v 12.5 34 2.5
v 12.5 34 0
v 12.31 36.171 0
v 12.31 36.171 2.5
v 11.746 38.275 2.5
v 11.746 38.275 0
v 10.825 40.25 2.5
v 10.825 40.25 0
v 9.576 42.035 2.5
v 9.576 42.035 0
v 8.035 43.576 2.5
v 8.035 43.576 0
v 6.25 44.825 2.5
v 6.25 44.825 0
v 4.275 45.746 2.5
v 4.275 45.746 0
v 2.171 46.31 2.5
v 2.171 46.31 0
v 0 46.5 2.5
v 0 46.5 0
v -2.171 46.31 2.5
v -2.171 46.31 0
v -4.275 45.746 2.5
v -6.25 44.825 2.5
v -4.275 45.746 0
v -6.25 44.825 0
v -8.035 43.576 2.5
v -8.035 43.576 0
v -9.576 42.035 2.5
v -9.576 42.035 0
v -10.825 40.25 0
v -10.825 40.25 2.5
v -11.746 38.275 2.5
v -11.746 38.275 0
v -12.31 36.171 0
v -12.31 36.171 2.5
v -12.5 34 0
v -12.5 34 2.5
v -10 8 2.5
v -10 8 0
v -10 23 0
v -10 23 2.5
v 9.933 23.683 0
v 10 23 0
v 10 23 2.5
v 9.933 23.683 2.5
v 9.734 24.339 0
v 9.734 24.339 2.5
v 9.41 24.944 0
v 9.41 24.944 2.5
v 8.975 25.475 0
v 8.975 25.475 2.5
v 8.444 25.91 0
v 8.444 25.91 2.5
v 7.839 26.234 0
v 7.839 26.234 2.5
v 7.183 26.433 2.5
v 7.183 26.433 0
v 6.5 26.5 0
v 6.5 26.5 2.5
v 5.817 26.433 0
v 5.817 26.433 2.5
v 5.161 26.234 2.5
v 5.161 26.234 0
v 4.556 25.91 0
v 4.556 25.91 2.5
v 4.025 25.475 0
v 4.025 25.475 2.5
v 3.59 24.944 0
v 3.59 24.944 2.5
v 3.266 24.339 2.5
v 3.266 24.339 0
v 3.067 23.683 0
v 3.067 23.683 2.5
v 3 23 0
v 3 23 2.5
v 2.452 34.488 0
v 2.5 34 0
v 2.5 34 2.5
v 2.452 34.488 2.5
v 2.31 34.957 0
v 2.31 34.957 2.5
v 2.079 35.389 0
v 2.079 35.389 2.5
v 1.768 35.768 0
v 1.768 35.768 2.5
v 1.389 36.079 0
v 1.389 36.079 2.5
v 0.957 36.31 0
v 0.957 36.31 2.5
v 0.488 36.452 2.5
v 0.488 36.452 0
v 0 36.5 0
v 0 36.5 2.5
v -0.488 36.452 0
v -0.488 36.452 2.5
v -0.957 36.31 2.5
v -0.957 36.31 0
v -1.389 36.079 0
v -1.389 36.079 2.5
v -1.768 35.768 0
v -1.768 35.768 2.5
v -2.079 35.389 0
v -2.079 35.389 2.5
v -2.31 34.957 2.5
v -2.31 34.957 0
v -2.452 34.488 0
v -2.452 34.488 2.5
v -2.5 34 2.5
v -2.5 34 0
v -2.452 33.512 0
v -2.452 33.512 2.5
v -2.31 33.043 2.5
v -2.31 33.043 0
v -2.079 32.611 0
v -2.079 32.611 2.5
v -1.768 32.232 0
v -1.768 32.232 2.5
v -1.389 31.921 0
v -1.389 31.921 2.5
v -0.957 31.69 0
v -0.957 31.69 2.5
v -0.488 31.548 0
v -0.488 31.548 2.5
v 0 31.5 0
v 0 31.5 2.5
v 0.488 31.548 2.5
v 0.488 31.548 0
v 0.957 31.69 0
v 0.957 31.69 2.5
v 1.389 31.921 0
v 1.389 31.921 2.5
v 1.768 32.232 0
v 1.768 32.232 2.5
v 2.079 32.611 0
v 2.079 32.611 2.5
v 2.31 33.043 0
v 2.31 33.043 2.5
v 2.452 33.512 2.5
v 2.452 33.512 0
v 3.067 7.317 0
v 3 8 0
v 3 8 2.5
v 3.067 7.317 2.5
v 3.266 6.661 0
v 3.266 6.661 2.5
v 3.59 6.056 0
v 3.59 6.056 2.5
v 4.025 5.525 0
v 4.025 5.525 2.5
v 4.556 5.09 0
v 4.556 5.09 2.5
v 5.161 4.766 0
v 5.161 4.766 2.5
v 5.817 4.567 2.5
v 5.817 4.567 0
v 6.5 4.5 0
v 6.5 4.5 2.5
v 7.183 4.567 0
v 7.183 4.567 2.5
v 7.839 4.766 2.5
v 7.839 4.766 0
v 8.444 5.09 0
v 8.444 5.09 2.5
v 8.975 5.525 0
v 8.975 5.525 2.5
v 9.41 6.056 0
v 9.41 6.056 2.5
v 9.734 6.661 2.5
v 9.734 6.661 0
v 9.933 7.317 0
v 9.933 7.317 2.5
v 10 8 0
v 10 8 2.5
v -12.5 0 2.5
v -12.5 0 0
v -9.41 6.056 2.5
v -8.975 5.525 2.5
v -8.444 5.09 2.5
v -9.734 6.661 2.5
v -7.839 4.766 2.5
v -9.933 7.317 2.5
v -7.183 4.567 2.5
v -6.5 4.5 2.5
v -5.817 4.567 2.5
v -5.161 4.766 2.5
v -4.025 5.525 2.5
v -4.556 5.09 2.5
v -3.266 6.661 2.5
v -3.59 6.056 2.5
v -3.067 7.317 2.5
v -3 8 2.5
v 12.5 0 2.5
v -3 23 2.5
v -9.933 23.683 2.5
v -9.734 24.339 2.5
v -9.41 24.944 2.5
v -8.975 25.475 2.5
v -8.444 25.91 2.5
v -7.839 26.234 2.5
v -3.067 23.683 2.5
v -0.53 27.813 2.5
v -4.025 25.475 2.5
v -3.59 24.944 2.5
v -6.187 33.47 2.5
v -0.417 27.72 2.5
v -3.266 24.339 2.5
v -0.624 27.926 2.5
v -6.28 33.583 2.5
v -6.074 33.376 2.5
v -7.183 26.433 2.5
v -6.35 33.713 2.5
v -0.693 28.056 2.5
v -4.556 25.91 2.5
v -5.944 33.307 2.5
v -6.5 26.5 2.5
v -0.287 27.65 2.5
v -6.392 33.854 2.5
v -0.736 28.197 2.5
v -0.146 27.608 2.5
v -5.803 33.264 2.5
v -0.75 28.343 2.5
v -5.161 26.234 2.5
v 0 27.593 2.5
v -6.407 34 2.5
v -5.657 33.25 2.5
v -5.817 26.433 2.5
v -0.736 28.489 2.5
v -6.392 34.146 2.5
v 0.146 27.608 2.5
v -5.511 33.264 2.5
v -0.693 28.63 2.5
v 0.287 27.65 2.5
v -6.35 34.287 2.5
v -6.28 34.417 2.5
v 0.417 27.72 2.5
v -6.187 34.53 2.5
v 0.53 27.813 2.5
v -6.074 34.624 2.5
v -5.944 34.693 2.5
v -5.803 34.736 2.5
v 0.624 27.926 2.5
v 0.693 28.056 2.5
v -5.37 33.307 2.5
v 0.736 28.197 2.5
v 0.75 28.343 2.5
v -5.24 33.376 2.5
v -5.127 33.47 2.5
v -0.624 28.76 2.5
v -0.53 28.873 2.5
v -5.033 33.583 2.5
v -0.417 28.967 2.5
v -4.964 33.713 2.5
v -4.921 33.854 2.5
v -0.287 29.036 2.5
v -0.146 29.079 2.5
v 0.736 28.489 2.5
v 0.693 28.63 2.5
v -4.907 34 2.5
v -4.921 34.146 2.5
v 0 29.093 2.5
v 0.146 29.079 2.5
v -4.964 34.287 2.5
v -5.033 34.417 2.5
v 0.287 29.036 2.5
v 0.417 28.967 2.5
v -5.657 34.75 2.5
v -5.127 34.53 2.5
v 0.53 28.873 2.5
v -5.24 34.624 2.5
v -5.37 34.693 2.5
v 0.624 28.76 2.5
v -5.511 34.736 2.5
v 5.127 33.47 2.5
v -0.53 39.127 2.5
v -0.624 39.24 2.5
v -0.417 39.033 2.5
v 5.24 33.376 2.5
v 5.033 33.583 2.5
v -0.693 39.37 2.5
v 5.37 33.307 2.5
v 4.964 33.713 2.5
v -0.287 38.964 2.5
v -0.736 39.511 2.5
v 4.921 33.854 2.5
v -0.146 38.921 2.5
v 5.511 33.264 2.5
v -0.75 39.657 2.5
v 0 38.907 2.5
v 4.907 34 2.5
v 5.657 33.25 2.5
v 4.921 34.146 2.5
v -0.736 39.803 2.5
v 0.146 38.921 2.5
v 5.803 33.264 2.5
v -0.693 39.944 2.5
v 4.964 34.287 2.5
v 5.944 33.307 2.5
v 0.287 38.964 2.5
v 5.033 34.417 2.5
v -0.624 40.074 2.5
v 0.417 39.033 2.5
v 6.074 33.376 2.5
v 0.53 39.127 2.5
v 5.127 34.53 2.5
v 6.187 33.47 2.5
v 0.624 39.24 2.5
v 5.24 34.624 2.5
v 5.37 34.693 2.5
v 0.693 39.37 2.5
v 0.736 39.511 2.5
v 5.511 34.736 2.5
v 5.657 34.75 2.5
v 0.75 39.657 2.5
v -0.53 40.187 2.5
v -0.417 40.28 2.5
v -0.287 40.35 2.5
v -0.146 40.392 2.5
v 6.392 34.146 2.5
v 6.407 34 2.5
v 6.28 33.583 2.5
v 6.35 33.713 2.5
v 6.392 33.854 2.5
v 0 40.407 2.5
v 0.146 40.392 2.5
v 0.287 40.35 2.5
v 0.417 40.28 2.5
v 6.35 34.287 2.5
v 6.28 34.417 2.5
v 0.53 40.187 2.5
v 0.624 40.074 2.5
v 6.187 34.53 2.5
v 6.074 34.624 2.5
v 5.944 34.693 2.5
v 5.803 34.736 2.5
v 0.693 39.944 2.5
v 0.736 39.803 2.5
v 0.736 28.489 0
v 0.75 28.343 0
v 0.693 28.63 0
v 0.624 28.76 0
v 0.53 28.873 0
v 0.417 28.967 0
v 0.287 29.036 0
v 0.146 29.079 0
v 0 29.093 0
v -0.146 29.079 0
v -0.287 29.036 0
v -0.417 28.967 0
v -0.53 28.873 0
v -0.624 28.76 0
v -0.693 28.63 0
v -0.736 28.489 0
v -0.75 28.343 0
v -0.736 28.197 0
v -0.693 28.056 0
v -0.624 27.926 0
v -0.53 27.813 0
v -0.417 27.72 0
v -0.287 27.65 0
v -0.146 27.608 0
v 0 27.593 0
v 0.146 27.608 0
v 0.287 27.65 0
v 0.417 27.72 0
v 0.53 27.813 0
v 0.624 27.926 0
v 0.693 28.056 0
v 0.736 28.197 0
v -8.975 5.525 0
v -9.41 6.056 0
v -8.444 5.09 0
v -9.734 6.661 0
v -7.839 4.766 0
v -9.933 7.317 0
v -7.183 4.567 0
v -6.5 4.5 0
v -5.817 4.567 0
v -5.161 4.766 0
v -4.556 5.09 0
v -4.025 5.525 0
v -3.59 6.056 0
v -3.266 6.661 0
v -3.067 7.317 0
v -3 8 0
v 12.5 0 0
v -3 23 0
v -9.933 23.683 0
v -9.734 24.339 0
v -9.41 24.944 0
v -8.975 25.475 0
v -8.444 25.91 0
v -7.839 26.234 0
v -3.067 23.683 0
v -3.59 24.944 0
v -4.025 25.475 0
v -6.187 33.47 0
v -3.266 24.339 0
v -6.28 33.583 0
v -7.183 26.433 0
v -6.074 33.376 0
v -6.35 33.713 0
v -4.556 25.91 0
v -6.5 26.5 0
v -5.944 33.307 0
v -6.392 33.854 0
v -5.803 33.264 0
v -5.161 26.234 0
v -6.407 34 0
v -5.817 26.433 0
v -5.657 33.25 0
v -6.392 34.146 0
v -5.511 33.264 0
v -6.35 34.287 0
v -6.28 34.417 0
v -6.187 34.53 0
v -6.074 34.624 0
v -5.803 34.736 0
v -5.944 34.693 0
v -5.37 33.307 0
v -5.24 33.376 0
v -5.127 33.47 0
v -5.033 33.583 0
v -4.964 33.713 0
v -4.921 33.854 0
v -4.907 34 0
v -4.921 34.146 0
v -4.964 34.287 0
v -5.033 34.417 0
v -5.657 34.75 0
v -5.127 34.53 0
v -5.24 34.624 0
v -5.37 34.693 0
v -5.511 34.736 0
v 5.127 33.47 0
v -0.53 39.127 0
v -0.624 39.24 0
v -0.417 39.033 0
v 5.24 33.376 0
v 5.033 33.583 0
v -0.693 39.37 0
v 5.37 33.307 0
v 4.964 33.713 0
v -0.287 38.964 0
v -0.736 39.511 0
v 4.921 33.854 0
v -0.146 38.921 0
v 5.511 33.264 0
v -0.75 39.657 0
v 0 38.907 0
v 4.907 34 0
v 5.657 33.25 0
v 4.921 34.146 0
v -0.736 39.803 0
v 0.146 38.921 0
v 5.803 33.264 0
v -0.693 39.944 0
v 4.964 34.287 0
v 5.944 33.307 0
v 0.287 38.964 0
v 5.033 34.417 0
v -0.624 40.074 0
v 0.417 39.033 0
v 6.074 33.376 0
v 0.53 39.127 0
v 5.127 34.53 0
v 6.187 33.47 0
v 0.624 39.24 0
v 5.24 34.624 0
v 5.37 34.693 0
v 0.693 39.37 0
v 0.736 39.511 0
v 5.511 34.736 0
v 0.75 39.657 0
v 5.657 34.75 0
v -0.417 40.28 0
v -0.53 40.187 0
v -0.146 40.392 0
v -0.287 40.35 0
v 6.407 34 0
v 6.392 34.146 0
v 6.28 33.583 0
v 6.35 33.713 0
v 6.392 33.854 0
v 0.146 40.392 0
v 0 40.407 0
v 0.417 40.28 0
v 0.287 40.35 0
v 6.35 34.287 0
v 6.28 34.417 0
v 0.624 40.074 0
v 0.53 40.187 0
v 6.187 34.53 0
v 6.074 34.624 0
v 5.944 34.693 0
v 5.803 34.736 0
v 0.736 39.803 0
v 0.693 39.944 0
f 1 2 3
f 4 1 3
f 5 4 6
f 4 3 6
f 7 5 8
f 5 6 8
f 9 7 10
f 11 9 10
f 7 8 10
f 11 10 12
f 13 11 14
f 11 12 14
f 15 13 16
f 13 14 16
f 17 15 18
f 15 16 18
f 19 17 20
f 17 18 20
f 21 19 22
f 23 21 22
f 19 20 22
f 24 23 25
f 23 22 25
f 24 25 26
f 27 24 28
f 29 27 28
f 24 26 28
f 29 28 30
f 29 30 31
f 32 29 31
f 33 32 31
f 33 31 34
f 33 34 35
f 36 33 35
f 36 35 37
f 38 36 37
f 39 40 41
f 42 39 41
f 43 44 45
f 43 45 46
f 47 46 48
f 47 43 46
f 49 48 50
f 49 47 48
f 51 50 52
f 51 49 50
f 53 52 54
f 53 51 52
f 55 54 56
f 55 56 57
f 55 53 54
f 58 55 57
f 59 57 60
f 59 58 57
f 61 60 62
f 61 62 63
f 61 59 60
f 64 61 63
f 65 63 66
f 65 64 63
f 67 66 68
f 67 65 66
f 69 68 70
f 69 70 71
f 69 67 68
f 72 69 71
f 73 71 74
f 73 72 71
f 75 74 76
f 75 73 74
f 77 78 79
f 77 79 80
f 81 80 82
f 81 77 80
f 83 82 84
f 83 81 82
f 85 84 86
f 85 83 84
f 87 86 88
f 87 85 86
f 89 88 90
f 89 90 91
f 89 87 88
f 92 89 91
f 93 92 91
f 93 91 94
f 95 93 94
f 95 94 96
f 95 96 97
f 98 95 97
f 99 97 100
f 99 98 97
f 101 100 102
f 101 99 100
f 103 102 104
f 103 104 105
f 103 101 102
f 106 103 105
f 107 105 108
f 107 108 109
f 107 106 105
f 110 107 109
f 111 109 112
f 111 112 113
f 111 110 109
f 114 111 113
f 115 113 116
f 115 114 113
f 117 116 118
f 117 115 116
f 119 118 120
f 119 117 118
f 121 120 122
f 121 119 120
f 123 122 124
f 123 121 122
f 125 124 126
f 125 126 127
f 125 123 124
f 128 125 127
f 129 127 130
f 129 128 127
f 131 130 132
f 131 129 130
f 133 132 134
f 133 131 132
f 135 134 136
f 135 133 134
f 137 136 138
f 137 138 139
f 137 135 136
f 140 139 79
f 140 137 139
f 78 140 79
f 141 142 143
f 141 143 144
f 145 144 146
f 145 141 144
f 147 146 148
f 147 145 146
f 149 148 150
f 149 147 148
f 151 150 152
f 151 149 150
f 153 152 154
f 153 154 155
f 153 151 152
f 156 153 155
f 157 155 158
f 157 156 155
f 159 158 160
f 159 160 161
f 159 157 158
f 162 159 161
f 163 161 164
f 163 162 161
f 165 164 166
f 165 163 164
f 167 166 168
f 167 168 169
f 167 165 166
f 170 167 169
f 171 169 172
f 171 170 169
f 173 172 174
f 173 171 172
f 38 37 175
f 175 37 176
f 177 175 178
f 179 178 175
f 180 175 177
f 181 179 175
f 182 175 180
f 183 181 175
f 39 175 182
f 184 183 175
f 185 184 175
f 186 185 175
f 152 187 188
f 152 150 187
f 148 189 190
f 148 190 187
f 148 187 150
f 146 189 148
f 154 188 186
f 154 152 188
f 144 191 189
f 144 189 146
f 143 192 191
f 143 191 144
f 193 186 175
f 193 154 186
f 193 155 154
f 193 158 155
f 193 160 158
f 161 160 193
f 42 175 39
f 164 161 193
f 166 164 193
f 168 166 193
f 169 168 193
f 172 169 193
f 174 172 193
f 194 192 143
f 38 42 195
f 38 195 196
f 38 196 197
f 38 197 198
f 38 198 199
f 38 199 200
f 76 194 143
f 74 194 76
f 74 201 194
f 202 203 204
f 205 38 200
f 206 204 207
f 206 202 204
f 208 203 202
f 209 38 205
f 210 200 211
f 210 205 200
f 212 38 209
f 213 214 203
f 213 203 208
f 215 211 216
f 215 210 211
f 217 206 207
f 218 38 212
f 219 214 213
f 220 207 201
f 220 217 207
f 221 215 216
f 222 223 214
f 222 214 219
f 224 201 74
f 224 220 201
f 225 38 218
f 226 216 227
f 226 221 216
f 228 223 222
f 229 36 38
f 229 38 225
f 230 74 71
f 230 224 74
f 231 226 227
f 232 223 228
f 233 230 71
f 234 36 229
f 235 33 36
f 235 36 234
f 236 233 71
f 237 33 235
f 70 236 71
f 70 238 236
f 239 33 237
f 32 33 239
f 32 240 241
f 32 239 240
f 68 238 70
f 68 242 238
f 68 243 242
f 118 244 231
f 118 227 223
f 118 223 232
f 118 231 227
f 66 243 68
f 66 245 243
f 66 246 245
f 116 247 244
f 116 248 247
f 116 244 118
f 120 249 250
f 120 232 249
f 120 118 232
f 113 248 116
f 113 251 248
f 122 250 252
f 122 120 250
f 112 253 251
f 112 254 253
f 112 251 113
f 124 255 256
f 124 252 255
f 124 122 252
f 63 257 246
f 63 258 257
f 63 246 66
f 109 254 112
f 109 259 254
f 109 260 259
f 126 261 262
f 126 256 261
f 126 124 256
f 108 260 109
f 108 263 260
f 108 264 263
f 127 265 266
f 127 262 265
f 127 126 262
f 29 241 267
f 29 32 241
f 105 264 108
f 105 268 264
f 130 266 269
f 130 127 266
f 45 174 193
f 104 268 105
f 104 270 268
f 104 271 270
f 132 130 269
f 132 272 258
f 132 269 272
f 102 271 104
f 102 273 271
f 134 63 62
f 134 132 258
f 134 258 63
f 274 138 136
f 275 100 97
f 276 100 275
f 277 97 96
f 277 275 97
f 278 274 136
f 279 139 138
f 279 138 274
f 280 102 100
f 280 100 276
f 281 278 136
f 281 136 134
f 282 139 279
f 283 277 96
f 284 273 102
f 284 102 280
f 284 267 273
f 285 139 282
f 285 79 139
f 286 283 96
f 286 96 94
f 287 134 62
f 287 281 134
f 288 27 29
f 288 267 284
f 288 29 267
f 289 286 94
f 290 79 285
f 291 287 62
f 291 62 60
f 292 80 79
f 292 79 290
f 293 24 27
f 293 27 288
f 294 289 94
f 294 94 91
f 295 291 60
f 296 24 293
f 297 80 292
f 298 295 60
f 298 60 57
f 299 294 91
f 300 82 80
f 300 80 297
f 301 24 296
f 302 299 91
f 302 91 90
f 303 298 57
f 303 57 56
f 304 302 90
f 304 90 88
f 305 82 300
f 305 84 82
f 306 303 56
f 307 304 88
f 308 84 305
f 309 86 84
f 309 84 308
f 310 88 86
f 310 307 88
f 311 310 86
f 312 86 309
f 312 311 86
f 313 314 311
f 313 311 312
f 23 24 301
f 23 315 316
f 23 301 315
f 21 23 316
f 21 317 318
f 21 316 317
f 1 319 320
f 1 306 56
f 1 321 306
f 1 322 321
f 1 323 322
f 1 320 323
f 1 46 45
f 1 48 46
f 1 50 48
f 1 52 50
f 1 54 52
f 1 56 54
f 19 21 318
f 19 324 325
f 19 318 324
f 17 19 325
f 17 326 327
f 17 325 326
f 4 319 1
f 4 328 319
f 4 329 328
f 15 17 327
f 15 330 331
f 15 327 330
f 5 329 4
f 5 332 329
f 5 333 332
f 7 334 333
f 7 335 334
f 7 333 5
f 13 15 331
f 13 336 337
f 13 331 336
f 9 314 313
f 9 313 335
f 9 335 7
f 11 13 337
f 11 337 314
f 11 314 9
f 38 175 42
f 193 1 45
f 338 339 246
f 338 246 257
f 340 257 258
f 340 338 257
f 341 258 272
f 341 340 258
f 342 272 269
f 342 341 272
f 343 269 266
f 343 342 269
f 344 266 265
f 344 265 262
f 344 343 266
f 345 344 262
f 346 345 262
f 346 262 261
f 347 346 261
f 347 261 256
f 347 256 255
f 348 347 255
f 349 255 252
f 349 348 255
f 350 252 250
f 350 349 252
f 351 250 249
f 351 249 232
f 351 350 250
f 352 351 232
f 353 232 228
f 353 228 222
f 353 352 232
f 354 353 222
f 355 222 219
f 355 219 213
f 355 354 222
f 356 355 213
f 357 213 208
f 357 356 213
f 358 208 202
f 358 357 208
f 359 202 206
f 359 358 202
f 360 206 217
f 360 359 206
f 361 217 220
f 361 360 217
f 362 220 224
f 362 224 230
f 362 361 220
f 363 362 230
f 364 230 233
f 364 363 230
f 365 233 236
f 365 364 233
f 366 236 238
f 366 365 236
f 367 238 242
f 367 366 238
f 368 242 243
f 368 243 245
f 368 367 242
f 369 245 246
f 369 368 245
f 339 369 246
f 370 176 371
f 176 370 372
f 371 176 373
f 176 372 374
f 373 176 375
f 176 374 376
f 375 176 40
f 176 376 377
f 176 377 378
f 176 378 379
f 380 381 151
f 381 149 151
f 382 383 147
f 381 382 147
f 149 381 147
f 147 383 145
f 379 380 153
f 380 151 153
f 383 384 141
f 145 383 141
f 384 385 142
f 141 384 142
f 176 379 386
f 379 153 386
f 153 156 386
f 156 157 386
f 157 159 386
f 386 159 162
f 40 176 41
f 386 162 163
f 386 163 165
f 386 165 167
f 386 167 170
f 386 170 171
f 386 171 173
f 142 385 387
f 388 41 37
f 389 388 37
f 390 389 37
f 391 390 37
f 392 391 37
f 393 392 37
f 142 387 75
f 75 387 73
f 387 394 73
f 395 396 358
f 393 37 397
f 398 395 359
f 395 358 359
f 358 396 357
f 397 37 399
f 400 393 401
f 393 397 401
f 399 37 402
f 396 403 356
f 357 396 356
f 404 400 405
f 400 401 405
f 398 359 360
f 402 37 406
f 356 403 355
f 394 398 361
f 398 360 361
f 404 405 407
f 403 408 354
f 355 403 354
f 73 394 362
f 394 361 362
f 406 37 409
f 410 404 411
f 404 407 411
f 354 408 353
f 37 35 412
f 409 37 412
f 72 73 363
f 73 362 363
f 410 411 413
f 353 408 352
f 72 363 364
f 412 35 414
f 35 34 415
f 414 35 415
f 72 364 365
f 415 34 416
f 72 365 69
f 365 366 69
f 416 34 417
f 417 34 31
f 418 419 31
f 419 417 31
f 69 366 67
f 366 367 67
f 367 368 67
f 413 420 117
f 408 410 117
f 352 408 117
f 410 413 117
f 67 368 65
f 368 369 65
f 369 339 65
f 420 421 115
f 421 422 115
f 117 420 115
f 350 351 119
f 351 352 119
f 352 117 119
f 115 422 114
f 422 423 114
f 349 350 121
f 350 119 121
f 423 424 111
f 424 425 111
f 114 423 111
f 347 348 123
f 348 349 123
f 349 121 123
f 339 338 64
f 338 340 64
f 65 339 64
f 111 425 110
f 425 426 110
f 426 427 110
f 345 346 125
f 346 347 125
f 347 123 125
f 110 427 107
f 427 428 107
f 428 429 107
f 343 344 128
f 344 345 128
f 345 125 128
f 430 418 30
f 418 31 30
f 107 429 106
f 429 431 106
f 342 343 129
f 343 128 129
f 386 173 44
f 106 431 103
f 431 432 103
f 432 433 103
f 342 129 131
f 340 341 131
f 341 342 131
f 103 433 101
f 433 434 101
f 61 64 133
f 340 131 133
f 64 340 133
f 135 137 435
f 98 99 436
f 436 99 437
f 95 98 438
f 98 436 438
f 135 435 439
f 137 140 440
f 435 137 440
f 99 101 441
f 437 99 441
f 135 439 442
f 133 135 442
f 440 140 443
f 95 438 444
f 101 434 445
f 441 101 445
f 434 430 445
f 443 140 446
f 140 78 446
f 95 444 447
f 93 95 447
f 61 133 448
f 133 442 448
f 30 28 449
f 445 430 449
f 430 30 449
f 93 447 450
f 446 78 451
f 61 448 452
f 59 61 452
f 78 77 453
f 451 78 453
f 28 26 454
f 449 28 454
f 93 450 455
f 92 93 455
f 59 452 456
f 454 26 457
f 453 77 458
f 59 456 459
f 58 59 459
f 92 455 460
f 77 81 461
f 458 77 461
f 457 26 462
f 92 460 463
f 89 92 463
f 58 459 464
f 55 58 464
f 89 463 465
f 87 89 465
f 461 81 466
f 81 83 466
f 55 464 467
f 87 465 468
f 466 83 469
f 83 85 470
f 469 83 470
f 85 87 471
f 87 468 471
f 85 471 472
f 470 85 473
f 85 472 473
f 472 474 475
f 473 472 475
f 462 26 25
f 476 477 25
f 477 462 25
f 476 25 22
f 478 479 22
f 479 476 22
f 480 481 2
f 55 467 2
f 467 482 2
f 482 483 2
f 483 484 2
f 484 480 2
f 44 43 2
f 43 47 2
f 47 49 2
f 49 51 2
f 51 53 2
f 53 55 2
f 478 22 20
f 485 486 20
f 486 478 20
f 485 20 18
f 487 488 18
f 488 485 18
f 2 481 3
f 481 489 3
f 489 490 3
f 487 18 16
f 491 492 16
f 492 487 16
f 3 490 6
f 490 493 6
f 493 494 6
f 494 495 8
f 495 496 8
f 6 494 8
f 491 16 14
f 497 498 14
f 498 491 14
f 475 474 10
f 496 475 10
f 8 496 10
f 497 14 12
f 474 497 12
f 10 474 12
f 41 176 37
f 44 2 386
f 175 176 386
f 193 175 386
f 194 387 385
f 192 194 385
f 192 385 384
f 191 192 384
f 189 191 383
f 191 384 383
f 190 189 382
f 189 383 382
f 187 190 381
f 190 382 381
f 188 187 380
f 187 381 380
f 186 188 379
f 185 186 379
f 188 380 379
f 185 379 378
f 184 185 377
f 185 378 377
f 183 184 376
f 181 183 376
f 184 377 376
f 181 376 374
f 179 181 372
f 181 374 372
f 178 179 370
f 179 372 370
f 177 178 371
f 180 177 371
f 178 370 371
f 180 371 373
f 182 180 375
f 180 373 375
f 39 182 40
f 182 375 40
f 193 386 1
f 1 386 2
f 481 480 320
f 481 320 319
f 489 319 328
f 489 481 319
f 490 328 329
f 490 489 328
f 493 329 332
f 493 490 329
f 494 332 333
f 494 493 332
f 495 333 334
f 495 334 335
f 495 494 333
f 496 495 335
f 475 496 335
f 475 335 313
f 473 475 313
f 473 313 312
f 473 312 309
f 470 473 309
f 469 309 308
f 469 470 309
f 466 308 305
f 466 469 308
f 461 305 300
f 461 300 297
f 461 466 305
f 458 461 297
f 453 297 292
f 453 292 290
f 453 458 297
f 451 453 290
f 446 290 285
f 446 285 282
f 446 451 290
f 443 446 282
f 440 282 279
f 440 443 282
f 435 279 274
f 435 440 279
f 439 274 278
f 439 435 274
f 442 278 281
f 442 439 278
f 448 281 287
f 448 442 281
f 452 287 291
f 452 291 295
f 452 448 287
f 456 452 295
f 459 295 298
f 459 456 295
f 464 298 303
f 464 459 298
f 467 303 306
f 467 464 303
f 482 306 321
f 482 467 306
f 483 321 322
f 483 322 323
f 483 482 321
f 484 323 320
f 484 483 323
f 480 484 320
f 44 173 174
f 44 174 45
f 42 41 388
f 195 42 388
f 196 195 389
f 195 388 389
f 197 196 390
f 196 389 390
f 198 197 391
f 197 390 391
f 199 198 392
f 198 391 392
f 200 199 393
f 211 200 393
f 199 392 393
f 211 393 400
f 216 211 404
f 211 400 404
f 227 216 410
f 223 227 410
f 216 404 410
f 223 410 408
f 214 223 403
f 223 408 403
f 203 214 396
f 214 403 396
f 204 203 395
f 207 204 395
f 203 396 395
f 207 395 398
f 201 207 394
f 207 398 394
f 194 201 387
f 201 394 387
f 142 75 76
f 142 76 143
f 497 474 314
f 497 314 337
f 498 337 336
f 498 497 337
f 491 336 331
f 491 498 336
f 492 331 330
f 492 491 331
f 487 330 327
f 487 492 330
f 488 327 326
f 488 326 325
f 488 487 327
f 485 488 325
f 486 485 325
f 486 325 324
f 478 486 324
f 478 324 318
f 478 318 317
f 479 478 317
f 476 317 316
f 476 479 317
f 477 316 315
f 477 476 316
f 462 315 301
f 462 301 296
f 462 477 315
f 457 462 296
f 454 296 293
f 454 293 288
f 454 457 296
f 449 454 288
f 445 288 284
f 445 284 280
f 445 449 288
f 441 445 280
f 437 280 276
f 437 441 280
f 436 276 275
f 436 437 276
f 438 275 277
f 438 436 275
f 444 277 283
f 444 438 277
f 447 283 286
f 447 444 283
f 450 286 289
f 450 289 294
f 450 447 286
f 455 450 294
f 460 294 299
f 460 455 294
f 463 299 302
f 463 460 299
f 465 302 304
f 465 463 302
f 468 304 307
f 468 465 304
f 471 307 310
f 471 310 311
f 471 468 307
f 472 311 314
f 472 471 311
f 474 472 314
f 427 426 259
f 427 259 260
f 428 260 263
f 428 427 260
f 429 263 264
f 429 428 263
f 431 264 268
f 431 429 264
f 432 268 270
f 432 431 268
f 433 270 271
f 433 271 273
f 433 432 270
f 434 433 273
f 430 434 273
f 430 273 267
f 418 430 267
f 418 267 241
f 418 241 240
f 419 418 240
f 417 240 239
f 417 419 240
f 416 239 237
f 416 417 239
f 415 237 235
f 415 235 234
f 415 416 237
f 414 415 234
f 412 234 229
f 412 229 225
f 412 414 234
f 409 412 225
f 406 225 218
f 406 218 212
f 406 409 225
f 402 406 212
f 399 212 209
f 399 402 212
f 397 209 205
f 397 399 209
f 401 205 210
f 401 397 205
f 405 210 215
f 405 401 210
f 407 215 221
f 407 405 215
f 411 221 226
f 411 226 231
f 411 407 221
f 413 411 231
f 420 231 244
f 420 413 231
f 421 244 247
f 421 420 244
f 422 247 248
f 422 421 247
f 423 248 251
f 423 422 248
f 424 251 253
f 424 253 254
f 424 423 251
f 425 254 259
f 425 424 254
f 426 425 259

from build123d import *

# Parameters (mm, degrees)
SZKIC1_R                    = 2.5
SZKIC1_R_2                  = 0.75
DODANIE_WYCI_GNI_CIE1_DEPTH = 2.5


with BuildPart() as part:
    # Szkic1 → Dodanie-wyciągnięcie1 (new body)
    with BuildSketch(Plane.XY):
        with BuildLine():
            Line((-12.5, 34), (-12.5, 0))
            Line((-12.5, 0), (12.5, 0))
            Line((12.5, 0), (12.5, 34))
            ThreePointArc((12.5, 34), (0, 46.5), (-12.5, 34))
        make_face()
        with Locations((0, 34)):
            Circle(SZKIC1_R, mode=Mode.SUBTRACT)
        with Locations((0, 39.656854249)):
            Circle(SZKIC1_R_2, mode=Mode.SUBTRACT)
        with Locations((5.656854249, 34)):
            Circle(SZKIC1_R_2, mode=Mode.SUBTRACT)
        with Locations((0, 28.343145751)):
            Circle(SZKIC1_R_2, mode=Mode.SUBTRACT)
        with Locations((-5.656854249, 34)):
            Circle(SZKIC1_R_2, mode=Mode.SUBTRACT)
        with BuildLine():
            Line((-3, 23), (-3, 8))
            ThreePointArc((-3, 8), (-6.5, 4.5), (-10, 8))
            Line((-10, 8), (-10, 23))
            ThreePointArc((-10, 23), (-6.5, 26.5), (-3, 23))
        make_face(mode=Mode.SUBTRACT)
        with BuildLine():
            Line((3, 23), (3, 8))
            ThreePointArc((3, 8), (6.5, 4.5), (10, 8))
            Line((10, 8), (10, 23))
            ThreePointArc((10, 23), (6.5, 26.5), (3, 23))
        make_face(mode=Mode.SUBTRACT)
    extrude(amount=DODANIE_WYCI_GNI_CIE1_DEPTH)


solid = part.part
